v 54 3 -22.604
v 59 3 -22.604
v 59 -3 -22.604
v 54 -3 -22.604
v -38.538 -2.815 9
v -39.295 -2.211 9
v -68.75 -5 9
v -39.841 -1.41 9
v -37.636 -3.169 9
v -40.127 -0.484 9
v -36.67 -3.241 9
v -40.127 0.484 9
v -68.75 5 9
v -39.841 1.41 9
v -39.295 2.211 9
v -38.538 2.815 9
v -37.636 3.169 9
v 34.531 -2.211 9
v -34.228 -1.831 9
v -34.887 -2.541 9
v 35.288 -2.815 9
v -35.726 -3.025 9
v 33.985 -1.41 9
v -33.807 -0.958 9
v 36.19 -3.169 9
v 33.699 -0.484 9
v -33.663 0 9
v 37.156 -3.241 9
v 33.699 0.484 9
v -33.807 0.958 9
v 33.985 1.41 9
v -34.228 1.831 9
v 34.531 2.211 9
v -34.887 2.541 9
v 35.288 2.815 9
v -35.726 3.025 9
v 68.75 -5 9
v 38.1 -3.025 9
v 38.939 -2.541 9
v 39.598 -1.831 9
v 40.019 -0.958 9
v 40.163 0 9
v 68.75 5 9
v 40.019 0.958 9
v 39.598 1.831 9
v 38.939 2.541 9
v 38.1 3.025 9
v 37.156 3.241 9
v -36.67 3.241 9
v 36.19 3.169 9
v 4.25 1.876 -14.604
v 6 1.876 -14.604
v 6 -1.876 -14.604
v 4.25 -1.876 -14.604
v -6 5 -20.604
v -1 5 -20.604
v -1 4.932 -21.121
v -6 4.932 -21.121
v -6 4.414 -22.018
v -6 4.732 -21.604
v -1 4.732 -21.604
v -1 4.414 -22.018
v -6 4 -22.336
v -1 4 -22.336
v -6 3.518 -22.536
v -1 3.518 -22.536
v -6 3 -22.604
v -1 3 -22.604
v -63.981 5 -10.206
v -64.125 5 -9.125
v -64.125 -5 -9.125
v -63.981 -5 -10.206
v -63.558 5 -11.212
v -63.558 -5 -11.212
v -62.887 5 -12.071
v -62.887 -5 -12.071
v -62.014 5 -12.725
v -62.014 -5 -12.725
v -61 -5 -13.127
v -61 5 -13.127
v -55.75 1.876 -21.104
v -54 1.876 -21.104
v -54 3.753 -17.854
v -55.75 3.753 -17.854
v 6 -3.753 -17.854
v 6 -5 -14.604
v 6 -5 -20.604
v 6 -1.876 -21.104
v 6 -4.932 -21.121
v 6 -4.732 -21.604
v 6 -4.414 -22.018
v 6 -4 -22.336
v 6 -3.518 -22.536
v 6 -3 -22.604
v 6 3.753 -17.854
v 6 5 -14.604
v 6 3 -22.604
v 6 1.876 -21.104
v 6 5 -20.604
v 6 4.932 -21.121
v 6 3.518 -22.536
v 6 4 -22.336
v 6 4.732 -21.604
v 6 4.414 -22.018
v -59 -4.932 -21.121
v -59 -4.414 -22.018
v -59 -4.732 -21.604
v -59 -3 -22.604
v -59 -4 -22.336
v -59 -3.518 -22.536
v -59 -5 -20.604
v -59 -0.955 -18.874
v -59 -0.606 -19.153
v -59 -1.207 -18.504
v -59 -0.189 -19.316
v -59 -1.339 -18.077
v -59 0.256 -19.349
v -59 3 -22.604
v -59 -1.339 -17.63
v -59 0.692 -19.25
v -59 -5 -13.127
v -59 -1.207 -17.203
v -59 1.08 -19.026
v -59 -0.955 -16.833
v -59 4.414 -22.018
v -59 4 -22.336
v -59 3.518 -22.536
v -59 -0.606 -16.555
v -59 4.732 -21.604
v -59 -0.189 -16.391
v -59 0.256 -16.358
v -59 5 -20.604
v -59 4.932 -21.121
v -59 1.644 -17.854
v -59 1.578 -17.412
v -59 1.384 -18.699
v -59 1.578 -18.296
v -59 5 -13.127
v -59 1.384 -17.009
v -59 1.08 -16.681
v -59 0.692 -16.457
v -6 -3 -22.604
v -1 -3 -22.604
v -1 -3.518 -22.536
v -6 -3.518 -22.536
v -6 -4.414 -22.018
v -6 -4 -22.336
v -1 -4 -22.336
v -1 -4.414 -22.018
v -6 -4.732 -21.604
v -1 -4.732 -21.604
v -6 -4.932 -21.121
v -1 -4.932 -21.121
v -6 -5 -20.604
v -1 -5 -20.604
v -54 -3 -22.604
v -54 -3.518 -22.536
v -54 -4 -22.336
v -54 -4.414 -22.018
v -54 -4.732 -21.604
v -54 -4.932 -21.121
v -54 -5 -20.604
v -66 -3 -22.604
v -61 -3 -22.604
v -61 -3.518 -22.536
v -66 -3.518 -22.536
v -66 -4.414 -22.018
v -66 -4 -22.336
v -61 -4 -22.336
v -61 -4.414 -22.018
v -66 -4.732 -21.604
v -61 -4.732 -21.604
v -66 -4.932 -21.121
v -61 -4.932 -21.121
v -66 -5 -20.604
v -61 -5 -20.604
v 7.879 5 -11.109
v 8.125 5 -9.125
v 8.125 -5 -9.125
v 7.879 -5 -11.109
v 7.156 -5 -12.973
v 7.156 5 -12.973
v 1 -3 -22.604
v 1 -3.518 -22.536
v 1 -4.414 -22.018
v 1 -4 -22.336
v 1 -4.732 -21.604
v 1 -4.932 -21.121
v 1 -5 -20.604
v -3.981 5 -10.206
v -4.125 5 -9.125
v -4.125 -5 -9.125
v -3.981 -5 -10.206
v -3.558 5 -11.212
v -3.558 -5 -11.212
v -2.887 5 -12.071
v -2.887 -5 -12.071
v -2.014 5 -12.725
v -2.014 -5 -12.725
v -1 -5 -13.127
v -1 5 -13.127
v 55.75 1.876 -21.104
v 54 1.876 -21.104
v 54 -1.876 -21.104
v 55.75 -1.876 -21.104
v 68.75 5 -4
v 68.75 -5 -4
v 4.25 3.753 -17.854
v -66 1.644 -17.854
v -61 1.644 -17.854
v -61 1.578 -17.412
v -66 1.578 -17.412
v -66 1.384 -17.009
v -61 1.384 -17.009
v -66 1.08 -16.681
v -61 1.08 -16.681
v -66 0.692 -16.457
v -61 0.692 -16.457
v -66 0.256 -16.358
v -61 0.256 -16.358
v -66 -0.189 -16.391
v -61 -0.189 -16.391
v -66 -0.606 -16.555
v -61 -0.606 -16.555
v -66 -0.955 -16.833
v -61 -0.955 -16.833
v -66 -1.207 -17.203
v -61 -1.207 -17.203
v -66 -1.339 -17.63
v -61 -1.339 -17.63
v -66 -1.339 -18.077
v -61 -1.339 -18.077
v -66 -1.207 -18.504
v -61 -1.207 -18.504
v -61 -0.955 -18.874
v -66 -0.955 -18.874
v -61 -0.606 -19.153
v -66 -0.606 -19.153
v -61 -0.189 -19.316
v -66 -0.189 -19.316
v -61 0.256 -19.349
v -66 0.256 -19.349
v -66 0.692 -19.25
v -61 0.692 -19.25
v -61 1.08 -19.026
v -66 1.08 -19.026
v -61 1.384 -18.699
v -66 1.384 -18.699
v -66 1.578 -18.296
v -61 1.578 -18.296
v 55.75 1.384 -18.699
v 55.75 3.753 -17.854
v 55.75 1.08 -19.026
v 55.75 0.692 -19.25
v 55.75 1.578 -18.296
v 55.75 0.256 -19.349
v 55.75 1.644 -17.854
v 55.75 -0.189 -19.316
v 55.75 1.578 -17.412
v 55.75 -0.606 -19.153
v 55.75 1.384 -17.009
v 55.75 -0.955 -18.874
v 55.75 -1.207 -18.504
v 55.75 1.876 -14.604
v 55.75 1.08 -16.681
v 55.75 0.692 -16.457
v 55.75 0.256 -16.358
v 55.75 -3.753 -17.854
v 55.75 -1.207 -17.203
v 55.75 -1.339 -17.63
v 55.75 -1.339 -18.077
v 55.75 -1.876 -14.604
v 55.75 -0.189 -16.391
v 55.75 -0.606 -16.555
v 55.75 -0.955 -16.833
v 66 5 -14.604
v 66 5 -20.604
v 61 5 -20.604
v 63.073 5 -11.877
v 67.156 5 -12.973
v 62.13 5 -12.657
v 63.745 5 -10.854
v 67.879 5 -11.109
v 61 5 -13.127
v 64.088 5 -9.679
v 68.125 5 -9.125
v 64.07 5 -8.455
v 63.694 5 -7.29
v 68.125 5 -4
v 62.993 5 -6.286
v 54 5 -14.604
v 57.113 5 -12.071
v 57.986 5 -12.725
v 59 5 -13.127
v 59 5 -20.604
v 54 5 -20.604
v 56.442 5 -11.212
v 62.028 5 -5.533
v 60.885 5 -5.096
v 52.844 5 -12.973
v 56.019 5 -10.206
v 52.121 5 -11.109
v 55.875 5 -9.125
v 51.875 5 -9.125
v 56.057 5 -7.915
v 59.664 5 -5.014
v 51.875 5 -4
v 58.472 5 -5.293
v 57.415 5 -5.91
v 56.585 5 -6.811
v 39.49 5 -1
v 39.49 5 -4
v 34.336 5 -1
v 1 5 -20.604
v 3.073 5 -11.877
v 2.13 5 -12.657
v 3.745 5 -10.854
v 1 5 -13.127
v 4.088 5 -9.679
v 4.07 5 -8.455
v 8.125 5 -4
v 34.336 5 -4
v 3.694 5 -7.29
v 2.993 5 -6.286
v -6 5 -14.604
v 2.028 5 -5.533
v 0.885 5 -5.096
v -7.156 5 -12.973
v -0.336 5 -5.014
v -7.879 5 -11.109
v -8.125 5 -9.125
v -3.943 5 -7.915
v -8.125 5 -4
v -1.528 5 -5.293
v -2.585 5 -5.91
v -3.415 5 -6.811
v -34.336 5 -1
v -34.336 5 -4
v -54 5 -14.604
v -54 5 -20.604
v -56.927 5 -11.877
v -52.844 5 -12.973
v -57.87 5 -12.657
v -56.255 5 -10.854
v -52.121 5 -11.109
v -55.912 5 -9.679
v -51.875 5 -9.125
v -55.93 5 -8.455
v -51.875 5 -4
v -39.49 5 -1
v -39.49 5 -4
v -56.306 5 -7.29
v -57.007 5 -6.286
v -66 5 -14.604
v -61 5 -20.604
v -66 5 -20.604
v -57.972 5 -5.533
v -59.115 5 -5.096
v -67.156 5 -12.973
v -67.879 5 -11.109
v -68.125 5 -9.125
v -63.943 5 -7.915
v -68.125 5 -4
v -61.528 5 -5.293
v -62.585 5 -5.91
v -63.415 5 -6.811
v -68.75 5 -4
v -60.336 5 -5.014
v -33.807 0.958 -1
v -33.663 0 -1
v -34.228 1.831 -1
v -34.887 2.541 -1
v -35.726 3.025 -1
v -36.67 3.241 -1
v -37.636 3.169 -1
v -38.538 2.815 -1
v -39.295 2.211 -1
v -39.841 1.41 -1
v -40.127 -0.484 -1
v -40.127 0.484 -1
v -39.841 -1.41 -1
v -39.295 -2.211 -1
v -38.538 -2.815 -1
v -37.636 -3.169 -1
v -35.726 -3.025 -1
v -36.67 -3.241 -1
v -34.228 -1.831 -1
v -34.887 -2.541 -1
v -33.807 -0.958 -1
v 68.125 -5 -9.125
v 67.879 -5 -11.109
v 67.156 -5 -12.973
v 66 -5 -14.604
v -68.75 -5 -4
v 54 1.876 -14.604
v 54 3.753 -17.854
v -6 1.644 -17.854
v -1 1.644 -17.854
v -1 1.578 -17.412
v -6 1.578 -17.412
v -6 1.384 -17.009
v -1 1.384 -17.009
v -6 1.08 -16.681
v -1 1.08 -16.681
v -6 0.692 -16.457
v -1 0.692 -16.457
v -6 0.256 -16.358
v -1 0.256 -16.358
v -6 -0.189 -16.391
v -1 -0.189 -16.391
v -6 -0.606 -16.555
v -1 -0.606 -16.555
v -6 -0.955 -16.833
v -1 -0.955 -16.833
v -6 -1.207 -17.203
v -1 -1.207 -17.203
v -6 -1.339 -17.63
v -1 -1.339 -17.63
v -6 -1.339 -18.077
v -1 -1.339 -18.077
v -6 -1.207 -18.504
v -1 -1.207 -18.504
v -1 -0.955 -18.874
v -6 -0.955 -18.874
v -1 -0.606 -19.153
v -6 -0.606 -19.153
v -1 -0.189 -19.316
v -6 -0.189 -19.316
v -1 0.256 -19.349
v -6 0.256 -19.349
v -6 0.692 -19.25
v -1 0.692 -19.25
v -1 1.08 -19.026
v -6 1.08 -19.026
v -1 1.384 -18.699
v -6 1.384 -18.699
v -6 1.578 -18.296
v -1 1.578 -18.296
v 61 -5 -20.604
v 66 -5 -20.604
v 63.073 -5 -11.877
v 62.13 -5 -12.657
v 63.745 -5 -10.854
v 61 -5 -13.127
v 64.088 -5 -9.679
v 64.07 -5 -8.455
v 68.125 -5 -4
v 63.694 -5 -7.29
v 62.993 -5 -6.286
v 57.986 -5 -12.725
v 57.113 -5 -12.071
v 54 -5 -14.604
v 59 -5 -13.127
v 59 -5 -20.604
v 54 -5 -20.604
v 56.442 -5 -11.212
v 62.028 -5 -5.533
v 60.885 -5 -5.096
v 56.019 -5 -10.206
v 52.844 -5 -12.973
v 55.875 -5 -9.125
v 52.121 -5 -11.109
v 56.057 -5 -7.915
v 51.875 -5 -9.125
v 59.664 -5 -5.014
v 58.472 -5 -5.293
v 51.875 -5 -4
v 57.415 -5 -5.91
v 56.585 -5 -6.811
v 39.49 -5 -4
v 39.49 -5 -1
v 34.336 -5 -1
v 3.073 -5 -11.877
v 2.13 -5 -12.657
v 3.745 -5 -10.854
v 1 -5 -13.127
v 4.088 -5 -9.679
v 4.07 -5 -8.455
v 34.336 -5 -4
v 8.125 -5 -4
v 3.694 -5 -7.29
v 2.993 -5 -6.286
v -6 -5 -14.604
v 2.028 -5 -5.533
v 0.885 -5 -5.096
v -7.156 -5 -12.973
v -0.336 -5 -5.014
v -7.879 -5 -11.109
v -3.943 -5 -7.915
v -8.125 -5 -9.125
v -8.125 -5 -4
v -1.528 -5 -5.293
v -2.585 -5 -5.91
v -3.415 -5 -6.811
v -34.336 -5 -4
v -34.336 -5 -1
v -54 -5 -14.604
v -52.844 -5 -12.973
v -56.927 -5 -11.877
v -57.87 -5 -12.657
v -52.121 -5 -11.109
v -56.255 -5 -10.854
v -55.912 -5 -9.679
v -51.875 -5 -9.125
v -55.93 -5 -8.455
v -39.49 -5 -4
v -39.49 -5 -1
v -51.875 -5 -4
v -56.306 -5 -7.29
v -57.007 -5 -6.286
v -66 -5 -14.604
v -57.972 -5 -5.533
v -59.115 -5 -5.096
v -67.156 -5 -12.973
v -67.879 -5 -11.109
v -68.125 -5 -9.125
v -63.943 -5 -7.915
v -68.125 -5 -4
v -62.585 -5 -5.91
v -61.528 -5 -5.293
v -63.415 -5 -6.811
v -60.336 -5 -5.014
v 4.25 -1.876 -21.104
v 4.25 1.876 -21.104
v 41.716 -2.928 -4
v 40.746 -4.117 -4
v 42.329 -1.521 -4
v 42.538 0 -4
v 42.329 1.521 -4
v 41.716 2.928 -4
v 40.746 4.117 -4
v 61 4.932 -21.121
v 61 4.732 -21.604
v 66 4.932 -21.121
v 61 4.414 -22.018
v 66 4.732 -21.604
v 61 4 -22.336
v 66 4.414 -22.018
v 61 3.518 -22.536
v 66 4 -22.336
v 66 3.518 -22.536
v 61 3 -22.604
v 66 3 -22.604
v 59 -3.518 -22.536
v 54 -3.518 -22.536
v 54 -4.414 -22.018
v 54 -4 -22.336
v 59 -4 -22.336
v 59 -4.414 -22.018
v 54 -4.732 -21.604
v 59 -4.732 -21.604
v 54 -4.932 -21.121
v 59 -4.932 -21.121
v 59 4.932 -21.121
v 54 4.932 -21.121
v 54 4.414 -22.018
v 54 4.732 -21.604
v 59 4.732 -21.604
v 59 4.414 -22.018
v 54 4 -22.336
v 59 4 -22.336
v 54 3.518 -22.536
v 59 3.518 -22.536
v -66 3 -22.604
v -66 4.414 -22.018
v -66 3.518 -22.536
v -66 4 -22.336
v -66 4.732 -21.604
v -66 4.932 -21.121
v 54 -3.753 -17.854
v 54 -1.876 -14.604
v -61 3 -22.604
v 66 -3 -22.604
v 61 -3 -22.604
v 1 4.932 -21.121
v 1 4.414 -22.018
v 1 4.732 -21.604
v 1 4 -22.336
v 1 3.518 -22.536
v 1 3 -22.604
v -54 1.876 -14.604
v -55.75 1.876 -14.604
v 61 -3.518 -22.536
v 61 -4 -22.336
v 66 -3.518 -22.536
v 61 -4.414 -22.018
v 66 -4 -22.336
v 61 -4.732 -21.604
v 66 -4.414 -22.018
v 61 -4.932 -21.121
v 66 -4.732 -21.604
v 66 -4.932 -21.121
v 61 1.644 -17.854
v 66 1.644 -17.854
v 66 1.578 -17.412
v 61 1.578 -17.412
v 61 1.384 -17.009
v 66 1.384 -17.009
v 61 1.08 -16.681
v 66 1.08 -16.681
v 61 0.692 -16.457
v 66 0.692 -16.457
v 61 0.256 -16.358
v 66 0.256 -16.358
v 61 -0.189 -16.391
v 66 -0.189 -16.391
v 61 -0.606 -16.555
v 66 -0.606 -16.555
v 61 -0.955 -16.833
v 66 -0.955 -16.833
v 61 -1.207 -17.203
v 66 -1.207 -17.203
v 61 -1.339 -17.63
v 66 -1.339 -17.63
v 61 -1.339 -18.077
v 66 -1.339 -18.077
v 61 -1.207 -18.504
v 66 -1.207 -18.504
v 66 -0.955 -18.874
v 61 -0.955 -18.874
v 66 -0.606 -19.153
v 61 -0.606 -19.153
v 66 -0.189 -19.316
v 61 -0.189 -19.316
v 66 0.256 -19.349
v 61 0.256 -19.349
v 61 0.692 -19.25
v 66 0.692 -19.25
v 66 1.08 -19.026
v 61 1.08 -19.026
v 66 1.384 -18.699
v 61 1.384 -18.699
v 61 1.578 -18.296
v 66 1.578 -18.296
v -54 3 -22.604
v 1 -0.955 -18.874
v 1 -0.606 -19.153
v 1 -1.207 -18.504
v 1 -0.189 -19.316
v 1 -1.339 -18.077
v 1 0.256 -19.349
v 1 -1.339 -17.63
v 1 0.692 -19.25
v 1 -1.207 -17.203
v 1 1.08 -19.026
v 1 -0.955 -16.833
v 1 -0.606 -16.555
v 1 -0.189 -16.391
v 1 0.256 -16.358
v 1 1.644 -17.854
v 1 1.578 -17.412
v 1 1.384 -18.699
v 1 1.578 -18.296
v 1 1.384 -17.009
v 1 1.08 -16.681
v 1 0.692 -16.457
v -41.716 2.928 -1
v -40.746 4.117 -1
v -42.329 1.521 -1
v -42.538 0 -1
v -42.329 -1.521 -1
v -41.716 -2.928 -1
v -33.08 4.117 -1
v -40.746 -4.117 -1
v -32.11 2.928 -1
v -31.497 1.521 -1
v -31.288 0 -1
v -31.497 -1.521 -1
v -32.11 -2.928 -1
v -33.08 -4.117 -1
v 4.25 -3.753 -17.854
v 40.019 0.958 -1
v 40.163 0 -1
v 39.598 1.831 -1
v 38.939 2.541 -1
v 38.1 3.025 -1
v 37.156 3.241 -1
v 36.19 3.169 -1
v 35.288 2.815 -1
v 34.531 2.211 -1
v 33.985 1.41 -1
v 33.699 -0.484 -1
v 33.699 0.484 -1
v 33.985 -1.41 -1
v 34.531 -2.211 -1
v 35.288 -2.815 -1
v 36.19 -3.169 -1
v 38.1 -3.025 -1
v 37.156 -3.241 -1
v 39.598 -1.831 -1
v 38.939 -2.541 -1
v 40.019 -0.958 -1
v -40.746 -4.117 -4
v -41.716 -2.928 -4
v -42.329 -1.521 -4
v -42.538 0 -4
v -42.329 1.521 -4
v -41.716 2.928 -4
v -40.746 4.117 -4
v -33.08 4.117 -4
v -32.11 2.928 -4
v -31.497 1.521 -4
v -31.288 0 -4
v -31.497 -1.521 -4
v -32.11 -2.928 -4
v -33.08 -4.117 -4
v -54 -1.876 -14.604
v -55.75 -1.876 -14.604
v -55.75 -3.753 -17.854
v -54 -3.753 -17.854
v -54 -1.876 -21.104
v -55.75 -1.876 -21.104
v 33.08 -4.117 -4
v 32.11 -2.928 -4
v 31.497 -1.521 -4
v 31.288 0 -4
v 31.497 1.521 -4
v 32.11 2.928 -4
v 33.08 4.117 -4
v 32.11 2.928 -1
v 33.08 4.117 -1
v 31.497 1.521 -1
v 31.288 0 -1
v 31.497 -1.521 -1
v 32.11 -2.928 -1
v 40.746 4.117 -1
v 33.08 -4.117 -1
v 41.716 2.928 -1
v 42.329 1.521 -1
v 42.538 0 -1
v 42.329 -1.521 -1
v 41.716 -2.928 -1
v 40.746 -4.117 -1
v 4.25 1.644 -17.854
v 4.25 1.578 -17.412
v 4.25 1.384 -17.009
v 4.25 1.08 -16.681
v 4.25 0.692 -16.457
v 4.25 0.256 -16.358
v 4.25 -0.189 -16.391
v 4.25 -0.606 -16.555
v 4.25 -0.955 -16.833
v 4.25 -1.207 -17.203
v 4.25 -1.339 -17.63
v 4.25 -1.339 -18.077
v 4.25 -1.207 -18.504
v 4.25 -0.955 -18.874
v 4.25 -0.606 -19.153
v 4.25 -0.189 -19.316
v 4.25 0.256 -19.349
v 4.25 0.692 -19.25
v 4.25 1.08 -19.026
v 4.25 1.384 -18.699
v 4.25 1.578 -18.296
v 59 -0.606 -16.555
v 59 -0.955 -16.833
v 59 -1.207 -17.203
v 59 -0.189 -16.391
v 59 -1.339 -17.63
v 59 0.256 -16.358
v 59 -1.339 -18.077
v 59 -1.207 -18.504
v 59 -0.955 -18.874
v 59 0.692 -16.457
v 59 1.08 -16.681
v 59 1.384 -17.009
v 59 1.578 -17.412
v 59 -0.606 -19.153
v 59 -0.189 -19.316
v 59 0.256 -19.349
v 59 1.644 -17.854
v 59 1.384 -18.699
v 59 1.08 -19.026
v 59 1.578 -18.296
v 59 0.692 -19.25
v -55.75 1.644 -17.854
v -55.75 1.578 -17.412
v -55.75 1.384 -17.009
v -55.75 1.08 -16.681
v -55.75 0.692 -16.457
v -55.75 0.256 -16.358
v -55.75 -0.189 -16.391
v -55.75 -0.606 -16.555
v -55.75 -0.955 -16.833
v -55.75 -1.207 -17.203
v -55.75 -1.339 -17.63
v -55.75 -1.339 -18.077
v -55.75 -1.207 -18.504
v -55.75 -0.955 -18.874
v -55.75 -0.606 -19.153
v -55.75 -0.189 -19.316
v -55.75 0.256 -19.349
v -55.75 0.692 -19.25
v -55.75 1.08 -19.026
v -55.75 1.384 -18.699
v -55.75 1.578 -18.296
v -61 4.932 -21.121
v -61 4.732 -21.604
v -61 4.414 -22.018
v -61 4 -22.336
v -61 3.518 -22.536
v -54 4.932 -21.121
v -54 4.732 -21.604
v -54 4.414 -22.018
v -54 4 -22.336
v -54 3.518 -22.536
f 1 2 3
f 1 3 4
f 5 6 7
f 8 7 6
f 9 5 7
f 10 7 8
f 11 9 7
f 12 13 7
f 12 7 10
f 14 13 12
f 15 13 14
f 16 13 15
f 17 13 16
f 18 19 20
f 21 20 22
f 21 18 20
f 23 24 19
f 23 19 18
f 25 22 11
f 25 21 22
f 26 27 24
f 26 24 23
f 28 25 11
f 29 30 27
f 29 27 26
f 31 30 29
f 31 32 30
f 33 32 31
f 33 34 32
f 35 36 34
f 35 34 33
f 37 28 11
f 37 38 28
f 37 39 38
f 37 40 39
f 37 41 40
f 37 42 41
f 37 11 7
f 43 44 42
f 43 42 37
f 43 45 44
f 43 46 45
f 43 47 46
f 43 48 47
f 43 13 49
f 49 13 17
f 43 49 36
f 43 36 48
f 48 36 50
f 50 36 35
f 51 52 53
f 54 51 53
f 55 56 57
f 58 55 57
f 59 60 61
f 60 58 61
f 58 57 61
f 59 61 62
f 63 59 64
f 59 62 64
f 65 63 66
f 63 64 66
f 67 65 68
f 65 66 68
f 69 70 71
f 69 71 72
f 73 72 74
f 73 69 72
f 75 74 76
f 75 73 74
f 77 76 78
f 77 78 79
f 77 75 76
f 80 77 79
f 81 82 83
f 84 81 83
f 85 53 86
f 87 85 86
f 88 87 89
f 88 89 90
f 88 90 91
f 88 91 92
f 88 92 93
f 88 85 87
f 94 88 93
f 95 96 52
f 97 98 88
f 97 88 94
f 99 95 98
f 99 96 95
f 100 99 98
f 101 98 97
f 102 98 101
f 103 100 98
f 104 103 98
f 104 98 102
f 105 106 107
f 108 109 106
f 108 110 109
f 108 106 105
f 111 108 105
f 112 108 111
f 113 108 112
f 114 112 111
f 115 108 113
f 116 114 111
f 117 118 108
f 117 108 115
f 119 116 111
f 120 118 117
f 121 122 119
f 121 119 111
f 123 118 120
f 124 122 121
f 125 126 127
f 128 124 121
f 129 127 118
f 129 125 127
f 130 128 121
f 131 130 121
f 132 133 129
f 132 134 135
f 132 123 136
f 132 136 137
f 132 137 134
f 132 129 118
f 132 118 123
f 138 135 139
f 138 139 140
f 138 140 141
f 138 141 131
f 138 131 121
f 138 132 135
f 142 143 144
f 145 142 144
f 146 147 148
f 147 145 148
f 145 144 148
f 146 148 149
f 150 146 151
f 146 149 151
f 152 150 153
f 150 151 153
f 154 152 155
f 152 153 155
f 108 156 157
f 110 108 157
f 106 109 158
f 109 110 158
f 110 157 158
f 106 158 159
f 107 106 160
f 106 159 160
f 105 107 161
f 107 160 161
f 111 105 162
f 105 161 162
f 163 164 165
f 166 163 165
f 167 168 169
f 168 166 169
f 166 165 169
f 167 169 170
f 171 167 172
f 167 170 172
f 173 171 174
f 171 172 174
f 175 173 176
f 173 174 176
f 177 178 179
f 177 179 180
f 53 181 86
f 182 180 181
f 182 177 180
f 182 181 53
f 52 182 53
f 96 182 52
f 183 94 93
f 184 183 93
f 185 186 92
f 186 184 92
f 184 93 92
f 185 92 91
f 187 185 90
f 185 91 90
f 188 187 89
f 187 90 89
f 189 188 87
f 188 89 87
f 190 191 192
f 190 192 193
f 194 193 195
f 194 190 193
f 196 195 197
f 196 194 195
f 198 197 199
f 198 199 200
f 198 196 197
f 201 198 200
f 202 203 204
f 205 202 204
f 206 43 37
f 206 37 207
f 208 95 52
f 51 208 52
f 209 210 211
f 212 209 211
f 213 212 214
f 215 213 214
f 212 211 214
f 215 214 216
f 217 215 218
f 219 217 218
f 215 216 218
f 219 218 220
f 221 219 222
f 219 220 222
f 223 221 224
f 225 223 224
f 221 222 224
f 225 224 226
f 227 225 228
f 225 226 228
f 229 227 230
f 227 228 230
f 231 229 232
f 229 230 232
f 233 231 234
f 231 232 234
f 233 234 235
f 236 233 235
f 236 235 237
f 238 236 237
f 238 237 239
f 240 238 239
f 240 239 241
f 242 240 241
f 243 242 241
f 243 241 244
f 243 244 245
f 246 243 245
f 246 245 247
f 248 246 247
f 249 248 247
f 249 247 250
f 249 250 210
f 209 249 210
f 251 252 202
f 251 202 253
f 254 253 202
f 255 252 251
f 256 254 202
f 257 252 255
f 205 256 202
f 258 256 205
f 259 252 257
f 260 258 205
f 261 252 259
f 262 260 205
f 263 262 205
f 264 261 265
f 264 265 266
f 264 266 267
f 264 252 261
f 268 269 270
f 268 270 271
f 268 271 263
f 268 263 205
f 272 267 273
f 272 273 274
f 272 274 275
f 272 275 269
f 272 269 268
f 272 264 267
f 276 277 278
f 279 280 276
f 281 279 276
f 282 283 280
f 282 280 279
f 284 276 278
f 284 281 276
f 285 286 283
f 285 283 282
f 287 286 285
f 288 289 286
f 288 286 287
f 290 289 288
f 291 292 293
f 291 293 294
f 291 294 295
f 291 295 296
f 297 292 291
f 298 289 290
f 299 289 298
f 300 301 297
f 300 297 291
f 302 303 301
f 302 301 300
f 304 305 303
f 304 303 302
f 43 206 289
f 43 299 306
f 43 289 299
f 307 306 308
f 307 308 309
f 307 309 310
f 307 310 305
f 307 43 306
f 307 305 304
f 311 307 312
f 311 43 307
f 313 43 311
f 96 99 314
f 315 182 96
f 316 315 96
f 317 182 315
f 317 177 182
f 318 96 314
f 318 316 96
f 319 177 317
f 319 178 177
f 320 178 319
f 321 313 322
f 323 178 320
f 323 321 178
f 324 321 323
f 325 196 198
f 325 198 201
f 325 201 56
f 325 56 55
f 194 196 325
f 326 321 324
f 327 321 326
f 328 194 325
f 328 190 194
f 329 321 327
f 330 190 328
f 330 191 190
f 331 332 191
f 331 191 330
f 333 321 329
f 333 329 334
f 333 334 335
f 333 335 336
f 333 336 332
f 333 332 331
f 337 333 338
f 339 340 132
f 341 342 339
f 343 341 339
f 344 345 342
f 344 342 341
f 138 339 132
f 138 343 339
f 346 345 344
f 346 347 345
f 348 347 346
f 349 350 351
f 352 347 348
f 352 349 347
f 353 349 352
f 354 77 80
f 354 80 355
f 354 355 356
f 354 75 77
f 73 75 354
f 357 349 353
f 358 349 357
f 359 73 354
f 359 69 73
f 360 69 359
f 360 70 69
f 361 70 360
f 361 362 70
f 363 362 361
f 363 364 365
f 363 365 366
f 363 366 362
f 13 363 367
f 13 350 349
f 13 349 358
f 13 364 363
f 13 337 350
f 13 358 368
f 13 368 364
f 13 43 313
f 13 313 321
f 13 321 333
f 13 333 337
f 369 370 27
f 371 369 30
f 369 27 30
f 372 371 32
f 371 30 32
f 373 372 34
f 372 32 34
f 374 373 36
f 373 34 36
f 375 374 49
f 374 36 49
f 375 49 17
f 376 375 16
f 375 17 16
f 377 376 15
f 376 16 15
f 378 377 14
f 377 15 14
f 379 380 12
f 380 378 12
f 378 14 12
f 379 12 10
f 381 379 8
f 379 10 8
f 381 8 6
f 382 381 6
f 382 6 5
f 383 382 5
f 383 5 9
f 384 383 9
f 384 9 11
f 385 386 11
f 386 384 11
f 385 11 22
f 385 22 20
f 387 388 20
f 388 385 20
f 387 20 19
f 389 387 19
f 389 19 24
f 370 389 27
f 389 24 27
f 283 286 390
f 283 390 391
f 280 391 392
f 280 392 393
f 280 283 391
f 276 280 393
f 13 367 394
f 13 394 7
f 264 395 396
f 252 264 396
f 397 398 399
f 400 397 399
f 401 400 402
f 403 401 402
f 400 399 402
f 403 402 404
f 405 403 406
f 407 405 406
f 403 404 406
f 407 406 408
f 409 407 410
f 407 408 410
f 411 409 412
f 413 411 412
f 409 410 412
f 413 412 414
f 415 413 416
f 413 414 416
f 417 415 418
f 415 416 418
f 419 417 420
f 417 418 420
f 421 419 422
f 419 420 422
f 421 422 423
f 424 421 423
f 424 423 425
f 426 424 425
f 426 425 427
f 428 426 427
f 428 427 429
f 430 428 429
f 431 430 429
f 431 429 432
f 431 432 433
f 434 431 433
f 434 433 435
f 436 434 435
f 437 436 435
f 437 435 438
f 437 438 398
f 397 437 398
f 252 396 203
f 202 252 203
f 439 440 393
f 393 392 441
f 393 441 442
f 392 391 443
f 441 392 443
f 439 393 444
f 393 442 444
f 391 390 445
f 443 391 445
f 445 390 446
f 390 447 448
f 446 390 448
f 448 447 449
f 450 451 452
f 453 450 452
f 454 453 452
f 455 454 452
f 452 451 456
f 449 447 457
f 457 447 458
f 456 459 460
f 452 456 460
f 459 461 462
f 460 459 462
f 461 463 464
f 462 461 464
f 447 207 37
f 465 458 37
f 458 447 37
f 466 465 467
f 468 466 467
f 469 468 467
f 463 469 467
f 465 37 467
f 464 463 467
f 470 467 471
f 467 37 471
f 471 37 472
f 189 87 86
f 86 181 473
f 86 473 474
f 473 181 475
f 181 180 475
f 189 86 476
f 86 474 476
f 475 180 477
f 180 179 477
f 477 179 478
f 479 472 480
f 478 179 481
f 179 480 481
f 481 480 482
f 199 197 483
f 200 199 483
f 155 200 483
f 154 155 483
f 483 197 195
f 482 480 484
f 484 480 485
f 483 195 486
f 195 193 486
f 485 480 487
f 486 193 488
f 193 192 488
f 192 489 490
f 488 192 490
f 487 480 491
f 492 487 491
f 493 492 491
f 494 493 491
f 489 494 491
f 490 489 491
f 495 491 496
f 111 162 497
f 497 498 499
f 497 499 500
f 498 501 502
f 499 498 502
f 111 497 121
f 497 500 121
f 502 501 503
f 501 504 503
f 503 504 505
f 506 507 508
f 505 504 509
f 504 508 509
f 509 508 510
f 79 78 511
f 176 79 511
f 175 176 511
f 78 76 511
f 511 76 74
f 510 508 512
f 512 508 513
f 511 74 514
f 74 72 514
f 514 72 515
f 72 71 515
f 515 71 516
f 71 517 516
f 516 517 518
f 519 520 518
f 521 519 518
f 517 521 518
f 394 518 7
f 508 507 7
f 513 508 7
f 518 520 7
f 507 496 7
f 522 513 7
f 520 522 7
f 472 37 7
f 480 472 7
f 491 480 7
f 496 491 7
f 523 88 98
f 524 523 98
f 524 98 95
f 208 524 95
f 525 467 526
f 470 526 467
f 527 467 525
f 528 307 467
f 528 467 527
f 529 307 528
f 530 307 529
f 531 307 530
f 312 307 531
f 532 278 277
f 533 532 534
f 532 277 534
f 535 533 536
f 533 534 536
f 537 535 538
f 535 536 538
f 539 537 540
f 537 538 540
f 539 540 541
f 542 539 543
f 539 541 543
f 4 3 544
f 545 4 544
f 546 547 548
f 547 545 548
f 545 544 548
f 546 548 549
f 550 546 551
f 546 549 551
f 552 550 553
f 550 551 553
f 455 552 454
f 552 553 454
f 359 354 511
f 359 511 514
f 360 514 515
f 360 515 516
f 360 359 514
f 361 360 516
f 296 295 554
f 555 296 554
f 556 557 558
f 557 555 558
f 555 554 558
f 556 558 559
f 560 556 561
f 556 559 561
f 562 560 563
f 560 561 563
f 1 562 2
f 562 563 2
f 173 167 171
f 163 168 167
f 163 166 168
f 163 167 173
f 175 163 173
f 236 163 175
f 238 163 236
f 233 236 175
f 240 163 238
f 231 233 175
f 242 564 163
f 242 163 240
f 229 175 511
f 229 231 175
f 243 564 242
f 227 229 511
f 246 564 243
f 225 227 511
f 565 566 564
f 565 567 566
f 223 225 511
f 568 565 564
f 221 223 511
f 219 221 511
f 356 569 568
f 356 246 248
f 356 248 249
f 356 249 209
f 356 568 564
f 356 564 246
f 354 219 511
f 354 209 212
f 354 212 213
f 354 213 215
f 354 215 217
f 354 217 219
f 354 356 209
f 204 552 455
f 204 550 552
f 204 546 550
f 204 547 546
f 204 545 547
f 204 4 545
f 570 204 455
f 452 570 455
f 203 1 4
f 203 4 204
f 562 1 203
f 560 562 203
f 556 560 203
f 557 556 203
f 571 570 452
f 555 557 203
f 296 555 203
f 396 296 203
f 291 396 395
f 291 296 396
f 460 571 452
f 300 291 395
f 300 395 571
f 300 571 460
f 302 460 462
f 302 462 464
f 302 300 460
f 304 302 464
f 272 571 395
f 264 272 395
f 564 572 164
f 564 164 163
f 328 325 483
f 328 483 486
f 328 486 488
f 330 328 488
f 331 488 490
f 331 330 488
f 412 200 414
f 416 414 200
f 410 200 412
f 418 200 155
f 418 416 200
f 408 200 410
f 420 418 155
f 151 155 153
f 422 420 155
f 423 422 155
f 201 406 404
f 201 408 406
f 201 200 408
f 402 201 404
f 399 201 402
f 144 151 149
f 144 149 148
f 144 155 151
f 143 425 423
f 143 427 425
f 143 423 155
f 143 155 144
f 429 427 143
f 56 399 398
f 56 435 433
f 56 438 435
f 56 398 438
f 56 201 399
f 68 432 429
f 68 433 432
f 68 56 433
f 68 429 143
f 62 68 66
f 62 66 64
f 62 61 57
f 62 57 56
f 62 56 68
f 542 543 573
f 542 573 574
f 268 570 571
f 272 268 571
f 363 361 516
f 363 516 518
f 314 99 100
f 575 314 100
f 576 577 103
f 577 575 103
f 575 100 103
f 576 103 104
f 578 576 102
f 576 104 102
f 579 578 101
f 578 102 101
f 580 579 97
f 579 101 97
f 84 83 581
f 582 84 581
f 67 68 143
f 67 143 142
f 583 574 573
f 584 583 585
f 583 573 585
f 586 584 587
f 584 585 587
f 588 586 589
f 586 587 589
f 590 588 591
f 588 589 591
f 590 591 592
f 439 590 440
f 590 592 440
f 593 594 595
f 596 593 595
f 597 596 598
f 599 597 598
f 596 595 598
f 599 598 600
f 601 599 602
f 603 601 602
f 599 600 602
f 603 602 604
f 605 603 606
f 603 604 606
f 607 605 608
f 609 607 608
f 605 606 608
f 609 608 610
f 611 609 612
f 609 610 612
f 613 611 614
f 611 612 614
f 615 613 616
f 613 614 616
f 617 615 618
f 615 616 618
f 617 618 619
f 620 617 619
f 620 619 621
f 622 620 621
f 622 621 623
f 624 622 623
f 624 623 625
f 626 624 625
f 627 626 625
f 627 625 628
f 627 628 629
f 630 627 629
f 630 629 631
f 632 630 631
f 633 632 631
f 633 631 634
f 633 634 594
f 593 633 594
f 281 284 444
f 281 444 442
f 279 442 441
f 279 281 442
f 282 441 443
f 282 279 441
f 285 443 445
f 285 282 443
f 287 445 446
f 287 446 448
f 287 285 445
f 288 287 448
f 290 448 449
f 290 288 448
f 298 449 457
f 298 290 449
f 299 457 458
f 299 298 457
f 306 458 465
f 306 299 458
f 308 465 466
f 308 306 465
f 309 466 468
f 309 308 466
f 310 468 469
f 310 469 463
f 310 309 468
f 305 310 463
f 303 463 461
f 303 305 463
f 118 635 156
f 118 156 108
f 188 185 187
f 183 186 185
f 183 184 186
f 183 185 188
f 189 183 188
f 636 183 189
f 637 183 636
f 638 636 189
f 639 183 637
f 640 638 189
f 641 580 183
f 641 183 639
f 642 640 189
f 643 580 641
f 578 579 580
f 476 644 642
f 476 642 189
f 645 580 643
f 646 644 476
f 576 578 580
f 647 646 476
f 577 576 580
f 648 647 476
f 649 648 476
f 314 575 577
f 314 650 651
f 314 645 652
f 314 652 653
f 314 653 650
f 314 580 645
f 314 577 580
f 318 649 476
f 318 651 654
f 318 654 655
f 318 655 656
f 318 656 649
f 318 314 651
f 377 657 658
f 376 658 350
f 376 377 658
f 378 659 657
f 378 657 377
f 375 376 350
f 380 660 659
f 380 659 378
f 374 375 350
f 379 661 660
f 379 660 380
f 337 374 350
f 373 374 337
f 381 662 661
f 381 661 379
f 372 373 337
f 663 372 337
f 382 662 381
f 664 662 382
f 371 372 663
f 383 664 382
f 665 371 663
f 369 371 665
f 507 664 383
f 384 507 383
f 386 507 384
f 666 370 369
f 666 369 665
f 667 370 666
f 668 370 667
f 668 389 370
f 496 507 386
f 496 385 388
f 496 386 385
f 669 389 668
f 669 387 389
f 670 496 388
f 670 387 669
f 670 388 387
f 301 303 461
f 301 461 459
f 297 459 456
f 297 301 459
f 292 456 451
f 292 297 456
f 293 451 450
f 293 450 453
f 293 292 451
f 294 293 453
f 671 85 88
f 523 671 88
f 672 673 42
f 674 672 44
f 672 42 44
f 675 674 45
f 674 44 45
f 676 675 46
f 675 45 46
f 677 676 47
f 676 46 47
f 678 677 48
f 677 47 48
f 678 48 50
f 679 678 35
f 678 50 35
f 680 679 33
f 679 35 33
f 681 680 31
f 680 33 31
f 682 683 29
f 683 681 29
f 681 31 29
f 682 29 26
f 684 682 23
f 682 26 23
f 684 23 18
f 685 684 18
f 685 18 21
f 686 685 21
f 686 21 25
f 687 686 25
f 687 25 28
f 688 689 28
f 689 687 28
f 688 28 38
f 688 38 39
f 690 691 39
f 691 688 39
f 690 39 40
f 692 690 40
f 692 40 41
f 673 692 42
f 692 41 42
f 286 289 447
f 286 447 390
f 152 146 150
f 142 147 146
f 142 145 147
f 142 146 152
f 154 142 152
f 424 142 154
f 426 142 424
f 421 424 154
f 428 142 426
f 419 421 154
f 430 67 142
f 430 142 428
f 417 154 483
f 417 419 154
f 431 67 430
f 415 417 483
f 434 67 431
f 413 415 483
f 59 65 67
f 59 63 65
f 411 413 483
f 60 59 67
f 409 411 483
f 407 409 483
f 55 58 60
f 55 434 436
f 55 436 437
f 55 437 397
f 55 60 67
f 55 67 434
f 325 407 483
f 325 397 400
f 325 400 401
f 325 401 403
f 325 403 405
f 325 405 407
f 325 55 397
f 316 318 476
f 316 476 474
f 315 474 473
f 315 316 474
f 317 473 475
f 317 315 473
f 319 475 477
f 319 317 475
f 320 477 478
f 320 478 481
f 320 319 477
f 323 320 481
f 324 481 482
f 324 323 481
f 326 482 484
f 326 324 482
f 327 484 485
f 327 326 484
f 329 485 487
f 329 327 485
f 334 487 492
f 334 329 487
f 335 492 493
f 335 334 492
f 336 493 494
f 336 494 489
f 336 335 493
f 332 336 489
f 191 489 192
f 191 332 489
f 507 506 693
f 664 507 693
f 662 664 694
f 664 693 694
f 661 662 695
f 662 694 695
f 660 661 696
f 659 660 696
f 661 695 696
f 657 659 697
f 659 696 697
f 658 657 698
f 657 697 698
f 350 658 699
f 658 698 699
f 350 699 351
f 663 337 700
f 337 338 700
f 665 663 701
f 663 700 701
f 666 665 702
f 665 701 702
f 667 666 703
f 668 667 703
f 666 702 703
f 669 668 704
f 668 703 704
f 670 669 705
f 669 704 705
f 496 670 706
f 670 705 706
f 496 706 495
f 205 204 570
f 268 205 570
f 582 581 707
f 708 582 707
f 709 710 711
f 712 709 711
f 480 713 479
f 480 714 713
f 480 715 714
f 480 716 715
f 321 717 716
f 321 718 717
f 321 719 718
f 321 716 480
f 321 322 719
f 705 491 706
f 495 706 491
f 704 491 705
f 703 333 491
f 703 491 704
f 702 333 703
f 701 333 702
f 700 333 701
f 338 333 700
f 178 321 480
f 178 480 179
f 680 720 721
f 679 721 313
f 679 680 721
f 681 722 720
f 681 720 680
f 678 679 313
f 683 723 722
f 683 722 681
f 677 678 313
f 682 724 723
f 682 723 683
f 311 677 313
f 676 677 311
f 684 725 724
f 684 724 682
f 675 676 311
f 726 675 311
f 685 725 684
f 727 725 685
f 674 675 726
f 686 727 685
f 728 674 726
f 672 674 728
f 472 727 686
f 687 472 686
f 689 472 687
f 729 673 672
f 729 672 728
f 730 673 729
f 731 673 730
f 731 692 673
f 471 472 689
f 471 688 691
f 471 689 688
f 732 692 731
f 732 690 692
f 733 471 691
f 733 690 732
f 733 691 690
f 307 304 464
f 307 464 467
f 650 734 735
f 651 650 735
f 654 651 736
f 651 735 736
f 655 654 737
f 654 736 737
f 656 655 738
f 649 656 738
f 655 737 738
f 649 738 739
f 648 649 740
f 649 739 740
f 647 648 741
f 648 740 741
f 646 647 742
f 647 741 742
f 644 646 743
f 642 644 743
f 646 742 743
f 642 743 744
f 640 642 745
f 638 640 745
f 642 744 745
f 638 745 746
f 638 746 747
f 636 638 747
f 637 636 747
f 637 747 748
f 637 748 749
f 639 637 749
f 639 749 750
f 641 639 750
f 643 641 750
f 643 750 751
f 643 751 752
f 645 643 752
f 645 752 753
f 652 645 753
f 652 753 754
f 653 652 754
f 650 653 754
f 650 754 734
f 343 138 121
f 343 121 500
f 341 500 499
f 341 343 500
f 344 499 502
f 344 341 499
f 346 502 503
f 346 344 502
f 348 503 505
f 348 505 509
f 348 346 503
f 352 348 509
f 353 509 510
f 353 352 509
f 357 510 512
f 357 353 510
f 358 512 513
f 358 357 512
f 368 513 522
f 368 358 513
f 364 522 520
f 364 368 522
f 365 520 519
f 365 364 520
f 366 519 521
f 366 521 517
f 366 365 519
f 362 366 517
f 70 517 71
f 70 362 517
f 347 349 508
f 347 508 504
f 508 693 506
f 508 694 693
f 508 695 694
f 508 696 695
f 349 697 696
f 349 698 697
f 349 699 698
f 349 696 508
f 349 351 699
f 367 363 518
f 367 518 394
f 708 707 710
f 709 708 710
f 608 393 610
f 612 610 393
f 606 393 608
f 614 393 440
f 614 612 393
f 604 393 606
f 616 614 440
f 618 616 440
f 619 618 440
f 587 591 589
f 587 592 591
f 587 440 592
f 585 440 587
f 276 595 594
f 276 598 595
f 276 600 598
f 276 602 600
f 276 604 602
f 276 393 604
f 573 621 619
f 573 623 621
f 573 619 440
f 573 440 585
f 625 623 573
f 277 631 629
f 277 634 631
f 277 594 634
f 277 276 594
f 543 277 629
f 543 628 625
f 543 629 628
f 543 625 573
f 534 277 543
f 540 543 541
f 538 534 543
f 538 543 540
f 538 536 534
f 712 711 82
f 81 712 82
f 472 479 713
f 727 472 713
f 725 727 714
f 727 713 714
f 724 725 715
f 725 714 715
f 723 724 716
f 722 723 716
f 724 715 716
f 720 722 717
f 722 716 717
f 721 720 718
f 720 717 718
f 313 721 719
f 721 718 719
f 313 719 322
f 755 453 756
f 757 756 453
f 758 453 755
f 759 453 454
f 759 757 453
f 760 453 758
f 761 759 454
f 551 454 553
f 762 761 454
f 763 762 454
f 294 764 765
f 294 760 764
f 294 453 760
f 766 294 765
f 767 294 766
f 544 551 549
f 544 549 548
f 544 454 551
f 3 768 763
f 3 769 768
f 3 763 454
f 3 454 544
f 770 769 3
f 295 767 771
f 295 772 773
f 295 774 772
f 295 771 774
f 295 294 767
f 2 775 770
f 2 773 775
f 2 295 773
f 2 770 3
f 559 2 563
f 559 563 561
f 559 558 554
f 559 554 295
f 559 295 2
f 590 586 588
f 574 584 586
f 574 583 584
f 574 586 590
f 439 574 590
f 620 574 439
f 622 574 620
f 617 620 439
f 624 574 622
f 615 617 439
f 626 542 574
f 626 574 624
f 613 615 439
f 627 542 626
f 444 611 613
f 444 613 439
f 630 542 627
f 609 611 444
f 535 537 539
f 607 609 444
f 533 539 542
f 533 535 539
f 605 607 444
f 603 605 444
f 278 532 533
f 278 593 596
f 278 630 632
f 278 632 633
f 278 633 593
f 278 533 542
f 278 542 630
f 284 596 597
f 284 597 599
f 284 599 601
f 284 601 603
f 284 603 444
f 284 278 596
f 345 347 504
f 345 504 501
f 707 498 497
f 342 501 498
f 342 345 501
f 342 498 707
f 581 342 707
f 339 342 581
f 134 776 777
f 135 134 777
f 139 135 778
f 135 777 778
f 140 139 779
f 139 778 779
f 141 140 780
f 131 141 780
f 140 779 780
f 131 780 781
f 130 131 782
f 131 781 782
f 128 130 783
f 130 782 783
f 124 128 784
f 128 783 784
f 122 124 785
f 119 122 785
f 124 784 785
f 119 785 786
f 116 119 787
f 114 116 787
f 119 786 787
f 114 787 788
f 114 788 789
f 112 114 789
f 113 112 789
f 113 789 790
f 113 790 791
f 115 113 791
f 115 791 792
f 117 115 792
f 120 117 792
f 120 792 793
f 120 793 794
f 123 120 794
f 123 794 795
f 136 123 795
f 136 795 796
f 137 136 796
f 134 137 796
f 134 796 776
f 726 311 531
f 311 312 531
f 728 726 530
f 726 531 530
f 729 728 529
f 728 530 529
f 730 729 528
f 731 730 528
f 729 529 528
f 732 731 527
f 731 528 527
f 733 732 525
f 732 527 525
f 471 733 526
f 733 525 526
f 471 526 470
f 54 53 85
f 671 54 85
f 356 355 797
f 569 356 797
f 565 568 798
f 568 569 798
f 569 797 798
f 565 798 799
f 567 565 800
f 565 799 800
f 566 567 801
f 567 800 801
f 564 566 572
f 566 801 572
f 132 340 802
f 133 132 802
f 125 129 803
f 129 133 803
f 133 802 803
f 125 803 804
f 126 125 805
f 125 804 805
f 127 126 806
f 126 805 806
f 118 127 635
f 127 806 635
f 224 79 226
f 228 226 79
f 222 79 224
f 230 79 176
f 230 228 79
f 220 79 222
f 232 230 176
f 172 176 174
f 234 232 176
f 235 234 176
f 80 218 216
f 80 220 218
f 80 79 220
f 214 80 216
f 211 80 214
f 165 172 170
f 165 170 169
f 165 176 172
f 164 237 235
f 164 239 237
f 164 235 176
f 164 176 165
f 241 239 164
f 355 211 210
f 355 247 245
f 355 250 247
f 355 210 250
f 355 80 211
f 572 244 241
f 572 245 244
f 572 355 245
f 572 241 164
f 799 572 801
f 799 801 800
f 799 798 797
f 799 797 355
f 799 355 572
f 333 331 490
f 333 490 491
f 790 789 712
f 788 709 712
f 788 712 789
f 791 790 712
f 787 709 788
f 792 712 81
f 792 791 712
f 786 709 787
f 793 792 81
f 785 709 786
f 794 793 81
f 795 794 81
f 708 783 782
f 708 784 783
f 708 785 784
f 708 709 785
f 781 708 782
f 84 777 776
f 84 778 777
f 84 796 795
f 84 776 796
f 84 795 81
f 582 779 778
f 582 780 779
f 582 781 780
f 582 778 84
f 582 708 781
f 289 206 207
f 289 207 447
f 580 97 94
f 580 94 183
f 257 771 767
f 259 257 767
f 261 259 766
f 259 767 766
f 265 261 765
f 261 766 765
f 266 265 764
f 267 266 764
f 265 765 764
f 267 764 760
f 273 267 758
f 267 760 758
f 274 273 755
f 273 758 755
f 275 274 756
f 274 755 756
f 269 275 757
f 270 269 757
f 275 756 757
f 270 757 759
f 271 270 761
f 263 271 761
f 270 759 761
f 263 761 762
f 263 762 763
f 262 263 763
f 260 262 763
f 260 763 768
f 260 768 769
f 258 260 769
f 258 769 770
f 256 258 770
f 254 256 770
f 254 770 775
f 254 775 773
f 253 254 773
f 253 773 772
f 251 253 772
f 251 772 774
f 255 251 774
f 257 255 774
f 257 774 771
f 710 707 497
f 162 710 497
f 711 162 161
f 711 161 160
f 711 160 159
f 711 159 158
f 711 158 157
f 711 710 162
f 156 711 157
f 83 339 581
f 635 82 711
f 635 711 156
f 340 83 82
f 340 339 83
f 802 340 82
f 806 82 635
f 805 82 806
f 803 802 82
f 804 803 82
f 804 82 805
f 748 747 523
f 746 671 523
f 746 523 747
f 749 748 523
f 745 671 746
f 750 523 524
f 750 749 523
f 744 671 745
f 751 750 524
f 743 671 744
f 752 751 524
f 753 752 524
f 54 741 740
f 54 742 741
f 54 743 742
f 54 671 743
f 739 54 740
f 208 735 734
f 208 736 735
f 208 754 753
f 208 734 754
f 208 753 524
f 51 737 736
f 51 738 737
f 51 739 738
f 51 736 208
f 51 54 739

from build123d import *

# Parameters (mm, degrees)
F0_W      = 137.5
F0_H      = 10
F1_DEPTH  = 9
F3_DEPTH  = 10
F5_DEPTH  = 1.75
F7_DEPTH  = 1.75
F9_DEPTH  = 1.75
F10_R     = 1.5
F11_DEPTH = 134.751
F12_R     = 3.25
F13_DEPTH = 31.6046517502
F15_DEPTH = 134.751
F16_R     = 5.625
F16_R_2   = 3.25
F17_DEPTH = 3


with BuildPart() as f1:
    # F0 (on Top) → F1 (new body)
    with BuildSketch(Plane.XY):
        Rectangle(F0_W, F0_H)
    extrude(amount=F1_DEPTH)

    # F2 (on face) → F3 (join, through all)
    with BuildSketch(Plane(origin=(0, 5, 0), x_dir=(-1, 0, 0), z_dir=(0, 1, 0))):
        with BuildLine():
            Line((-61, -22.6036517502), (-61, -17.1882267114))
            ThreePointArc((-61, -17.1882267114), (-63.7309525503, -16.342729426), (-66, -14.6036517502))
            Line((-66, -14.6036517502), (-66, -22.6036517502))
            Line((-66, -22.6036517502), (-61, -22.6036517502))
        make_face()
        with BuildLine():
            Line((-54, -22.6036517502), (-54, -14.6036517502))
            ThreePointArc((-54, -14.6036517502), (-56.2690474497, -16.342729426), (-59, -17.1882267114))
            Line((-59, -17.1882267114), (-59, -22.6036517502))
            Line((-59, -22.6036517502), (-54, -22.6036517502))
        make_face()
        with BuildLine():
            Line((-1, -22.6036517502), (-1, -17.1882267114))
            ThreePointArc((-1, -17.1882267114), (-3.7309525503, -16.342729426), (-6, -14.6036517502))
            Line((-6, -14.6036517502), (-6, -22.6036517502))
            Line((-6, -22.6036517502), (-1, -22.6036517502))
        make_face()
        with BuildLine():
            ThreePointArc((6, -14.6036517502), (3.7309525503, -16.342729426), (1, -17.1882267114))
            Line((1, -17.1882267114), (1, -22.6036517502))
            Line((1, -22.6036517502), (6, -22.6036517502))
            Line((6, -22.6036517502), (6, -14.6036517502))
        make_face()
        with BuildLine():
            ThreePointArc((59, -17.1882267114), (56.2690474497, -16.342729426), (54, -14.6036517502))
            Line((54, -14.6036517502), (54, -22.6036517502))
            Line((54, -22.6036517502), (59, -22.6036517502))
            Line((59, -22.6036517502), (59, -17.1882267114))
        make_face()
        with BuildLine():
            ThreePointArc((66, -14.6036517502), (63.7309525503, -16.342729426), (61, -17.1882267114))
            Line((61, -17.1882267114), (61, -22.6036517502))
            Line((61, -22.6036517502), (66, -22.6036517502))
            Line((66, -22.6036517502), (66, -14.6036517502))
        make_face()
        with BuildLine():
            ThreePointArc((-1, -13.1269526484), (-2.5387620014, -5.8737982991), (4.125, -9.125))
            ThreePointArc((4.125, -9.125), (3.2512017009, -11.6637620014), (1, -13.1269526484))
            Line((1, -13.1269526484), (1, -17.1882267114))
            ThreePointArc((1, -17.1882267114), (3.7309525503, -16.342729426), (6, -14.6036517502))
            ThreePointArc((6, -14.6036517502), (7.5751443881, -12.0631648184), (8.125, -9.125))
            Line((8.125, -9.125), (8.125, -4))
            Line((8.125, -4), (51.875, -4))
            Line((51.875, -4), (51.875, -9.125))
            ThreePointArc((51.875, -9.125), (52.4248556119, -12.0631648184), (54, -14.6036517502))
            ThreePointArc((54, -14.6036517502), (56.2690474497, -16.342729426), (59, -17.1882267114))
            Line((59, -17.1882267114), (59, -13.1269526484))
            ThreePointArc((59, -13.1269526484), (57.4612379986, -5.8737982991), (64.125, -9.125))
            ThreePointArc((64.125, -9.125), (63.2512017009, -11.6637620014), (61, -13.1269526484))
            Line((61, -13.1269526484), (61, -17.1882267114))
            ThreePointArc((61, -17.1882267114), (63.7309525503, -16.342729426), (66, -14.6036517502))
            ThreePointArc((66, -14.6036517502), (67.5751443881, -12.0631648184), (68.125, -9.125))
            Line((68.125, -9.125), (68.125, -4))
            Line((68.125, -4), (68.75, -4))
            Line((68.75, -4), (68.75, 0))
            Line((68.75, 0), (-68.75, 0))
            Line((-68.75, 0), (-68.75, -4))
            Line((-68.75, -4), (-68.125, -4))
            Line((-68.125, -4), (-68.125, -9.125))
            ThreePointArc((-68.125, -9.125), (-67.5751443881, -12.0631648184), (-66, -14.6036517502))
            ThreePointArc((-66, -14.6036517502), (-63.7309525503, -16.342729426), (-61, -17.1882267114))
            Line((-61, -17.1882267114), (-61, -13.1269526484))
            ThreePointArc((-61, -13.1269526484), (-62.5387620014, -5.8737982991), (-55.875, -9.125))
            ThreePointArc((-55.875, -9.125), (-56.7487982991, -11.6637620014), (-59, -13.1269526484))
            Line((-59, -13.1269526484), (-59, -17.1882267114))
            ThreePointArc((-59, -17.1882267114), (-56.2690474497, -16.342729426), (-54, -14.6036517502))
            ThreePointArc((-54, -14.6036517502), (-52.4248556119, -12.0631648184), (-51.875, -9.125))
            Line((-51.875, -9.125), (-51.875, -4))
            Line((-51.875, -4), (-8.125, -4))
            Line((-8.125, -4), (-8.125, -9.125))
            ThreePointArc((-8.125, -9.125), (-7.5751443881, -12.0631648184), (-6, -14.6036517502))
            ThreePointArc((-6, -14.6036517502), (-3.7309525503, -16.342729426), (-1, -17.1882267114))
            Line((-1, -17.1882267114), (-1, -13.1269526484))
        make_face()
    extrude(amount=-F3_DEPTH)

    # F4 (on face) → F5 (cut)
    with BuildSketch(Plane(origin=(54, 0, 0), x_dir=(0, -1, 0), z_dir=(-1, 0, 0))):
        Polygon((3.7527767497, -17.8536517502), (1.8763883749, -14.6036517502), (-1.8763883749, -14.6036517502), (-3.7527767497, -17.8536517502), (-1.8763883749, -21.1036517502), (1.8763883749, -21.1036517502), align=None)
    extrude(amount=-F5_DEPTH, mode=Mode.SUBTRACT)

    # F6 (on face) → F7 (cut)
    with BuildSketch(Plane.YZ.offset(6)):
        Polygon((3.7527767497, -17.8536517502), (1.8763883749, -14.6036517502), (-1.8763883749, -14.6036517502), (-3.7527767497, -17.8536517502), (-1.8763883749, -21.1036517502), (1.8763883749, -21.1036517502), align=None)
    extrude(amount=-F7_DEPTH, mode=Mode.SUBTRACT)

    # F8 (on face) → F9 (cut)
    with BuildSketch(Plane.YZ.offset(-54)):
        Polygon((1.8763883749, -14.6036517502), (-1.8763883749, -14.6036517502), (-3.7527767497, -17.8536517502), (-1.8763883749, -21.1036517502), (1.8763883749, -21.1036517502), (3.7527767497, -17.8536517502), align=None)
    extrude(amount=-F9_DEPTH, mode=Mode.SUBTRACT)

    # F10 (on face) → F11 (cut, through all)
    with BuildSketch(Plane.YZ.offset(66)):
        with Locations((0.1443375673, -17.8536517502)):
            Circle(F10_R)
    extrude(amount=-F11_DEPTH, mode=Mode.SUBTRACT)

    # F12 (on face) → F13 (cut, through all)
    with BuildSketch(Plane.XY.offset(9)):
        with Locations((36.913, 0)):
            Circle(F12_R)
        with Locations((-36.913, 0)):
            Circle(F12_R)
    extrude(amount=-F13_DEPTH, mode=Mode.SUBTRACT)

    # F14 (on face) → F15 (cut, through all)
    with BuildSketch(Plane.YZ.offset(66)):
        with BuildLine():
            ThreePointArc((-3, -22.6036517502), (-4.4142135624, -22.0178653126), (-5, -20.6036517502))
            Line((-5, -20.6036517502), (-5, -22.6036517502))
            Line((-5, -22.6036517502), (-3, -22.6036517502))
        make_face()
        with BuildLine():
            ThreePointArc((5, -20.6036517502), (4.4142135624, -22.0178653126), (3, -22.6036517502))
            Line((3, -22.6036517502), (5, -22.6036517502))
            Line((5, -22.6036517502), (5, -20.6036517502))
        make_face()
    extrude(amount=-F15_DEPTH, mode=Mode.SUBTRACT)

    # F16 (on face) → F17 (cut)
    with BuildSketch(Plane(origin=(0, 0, -4), x_dir=(1, 0, 0), z_dir=(0, 0, -1))):
        with Locations((-36.913, 0)):
            Circle(F16_R)
        with Locations((-36.913, 0)):
            Circle(F16_R_2, mode=Mode.SUBTRACT)
        with Locations((36.913, 0)):
            Circle(F16_R)
        with Locations((36.913, 0)):
            Circle(F16_R_2, mode=Mode.SUBTRACT)
    extrude(amount=-F17_DEPTH, mode=Mode.SUBTRACT)


solid = f1.part
